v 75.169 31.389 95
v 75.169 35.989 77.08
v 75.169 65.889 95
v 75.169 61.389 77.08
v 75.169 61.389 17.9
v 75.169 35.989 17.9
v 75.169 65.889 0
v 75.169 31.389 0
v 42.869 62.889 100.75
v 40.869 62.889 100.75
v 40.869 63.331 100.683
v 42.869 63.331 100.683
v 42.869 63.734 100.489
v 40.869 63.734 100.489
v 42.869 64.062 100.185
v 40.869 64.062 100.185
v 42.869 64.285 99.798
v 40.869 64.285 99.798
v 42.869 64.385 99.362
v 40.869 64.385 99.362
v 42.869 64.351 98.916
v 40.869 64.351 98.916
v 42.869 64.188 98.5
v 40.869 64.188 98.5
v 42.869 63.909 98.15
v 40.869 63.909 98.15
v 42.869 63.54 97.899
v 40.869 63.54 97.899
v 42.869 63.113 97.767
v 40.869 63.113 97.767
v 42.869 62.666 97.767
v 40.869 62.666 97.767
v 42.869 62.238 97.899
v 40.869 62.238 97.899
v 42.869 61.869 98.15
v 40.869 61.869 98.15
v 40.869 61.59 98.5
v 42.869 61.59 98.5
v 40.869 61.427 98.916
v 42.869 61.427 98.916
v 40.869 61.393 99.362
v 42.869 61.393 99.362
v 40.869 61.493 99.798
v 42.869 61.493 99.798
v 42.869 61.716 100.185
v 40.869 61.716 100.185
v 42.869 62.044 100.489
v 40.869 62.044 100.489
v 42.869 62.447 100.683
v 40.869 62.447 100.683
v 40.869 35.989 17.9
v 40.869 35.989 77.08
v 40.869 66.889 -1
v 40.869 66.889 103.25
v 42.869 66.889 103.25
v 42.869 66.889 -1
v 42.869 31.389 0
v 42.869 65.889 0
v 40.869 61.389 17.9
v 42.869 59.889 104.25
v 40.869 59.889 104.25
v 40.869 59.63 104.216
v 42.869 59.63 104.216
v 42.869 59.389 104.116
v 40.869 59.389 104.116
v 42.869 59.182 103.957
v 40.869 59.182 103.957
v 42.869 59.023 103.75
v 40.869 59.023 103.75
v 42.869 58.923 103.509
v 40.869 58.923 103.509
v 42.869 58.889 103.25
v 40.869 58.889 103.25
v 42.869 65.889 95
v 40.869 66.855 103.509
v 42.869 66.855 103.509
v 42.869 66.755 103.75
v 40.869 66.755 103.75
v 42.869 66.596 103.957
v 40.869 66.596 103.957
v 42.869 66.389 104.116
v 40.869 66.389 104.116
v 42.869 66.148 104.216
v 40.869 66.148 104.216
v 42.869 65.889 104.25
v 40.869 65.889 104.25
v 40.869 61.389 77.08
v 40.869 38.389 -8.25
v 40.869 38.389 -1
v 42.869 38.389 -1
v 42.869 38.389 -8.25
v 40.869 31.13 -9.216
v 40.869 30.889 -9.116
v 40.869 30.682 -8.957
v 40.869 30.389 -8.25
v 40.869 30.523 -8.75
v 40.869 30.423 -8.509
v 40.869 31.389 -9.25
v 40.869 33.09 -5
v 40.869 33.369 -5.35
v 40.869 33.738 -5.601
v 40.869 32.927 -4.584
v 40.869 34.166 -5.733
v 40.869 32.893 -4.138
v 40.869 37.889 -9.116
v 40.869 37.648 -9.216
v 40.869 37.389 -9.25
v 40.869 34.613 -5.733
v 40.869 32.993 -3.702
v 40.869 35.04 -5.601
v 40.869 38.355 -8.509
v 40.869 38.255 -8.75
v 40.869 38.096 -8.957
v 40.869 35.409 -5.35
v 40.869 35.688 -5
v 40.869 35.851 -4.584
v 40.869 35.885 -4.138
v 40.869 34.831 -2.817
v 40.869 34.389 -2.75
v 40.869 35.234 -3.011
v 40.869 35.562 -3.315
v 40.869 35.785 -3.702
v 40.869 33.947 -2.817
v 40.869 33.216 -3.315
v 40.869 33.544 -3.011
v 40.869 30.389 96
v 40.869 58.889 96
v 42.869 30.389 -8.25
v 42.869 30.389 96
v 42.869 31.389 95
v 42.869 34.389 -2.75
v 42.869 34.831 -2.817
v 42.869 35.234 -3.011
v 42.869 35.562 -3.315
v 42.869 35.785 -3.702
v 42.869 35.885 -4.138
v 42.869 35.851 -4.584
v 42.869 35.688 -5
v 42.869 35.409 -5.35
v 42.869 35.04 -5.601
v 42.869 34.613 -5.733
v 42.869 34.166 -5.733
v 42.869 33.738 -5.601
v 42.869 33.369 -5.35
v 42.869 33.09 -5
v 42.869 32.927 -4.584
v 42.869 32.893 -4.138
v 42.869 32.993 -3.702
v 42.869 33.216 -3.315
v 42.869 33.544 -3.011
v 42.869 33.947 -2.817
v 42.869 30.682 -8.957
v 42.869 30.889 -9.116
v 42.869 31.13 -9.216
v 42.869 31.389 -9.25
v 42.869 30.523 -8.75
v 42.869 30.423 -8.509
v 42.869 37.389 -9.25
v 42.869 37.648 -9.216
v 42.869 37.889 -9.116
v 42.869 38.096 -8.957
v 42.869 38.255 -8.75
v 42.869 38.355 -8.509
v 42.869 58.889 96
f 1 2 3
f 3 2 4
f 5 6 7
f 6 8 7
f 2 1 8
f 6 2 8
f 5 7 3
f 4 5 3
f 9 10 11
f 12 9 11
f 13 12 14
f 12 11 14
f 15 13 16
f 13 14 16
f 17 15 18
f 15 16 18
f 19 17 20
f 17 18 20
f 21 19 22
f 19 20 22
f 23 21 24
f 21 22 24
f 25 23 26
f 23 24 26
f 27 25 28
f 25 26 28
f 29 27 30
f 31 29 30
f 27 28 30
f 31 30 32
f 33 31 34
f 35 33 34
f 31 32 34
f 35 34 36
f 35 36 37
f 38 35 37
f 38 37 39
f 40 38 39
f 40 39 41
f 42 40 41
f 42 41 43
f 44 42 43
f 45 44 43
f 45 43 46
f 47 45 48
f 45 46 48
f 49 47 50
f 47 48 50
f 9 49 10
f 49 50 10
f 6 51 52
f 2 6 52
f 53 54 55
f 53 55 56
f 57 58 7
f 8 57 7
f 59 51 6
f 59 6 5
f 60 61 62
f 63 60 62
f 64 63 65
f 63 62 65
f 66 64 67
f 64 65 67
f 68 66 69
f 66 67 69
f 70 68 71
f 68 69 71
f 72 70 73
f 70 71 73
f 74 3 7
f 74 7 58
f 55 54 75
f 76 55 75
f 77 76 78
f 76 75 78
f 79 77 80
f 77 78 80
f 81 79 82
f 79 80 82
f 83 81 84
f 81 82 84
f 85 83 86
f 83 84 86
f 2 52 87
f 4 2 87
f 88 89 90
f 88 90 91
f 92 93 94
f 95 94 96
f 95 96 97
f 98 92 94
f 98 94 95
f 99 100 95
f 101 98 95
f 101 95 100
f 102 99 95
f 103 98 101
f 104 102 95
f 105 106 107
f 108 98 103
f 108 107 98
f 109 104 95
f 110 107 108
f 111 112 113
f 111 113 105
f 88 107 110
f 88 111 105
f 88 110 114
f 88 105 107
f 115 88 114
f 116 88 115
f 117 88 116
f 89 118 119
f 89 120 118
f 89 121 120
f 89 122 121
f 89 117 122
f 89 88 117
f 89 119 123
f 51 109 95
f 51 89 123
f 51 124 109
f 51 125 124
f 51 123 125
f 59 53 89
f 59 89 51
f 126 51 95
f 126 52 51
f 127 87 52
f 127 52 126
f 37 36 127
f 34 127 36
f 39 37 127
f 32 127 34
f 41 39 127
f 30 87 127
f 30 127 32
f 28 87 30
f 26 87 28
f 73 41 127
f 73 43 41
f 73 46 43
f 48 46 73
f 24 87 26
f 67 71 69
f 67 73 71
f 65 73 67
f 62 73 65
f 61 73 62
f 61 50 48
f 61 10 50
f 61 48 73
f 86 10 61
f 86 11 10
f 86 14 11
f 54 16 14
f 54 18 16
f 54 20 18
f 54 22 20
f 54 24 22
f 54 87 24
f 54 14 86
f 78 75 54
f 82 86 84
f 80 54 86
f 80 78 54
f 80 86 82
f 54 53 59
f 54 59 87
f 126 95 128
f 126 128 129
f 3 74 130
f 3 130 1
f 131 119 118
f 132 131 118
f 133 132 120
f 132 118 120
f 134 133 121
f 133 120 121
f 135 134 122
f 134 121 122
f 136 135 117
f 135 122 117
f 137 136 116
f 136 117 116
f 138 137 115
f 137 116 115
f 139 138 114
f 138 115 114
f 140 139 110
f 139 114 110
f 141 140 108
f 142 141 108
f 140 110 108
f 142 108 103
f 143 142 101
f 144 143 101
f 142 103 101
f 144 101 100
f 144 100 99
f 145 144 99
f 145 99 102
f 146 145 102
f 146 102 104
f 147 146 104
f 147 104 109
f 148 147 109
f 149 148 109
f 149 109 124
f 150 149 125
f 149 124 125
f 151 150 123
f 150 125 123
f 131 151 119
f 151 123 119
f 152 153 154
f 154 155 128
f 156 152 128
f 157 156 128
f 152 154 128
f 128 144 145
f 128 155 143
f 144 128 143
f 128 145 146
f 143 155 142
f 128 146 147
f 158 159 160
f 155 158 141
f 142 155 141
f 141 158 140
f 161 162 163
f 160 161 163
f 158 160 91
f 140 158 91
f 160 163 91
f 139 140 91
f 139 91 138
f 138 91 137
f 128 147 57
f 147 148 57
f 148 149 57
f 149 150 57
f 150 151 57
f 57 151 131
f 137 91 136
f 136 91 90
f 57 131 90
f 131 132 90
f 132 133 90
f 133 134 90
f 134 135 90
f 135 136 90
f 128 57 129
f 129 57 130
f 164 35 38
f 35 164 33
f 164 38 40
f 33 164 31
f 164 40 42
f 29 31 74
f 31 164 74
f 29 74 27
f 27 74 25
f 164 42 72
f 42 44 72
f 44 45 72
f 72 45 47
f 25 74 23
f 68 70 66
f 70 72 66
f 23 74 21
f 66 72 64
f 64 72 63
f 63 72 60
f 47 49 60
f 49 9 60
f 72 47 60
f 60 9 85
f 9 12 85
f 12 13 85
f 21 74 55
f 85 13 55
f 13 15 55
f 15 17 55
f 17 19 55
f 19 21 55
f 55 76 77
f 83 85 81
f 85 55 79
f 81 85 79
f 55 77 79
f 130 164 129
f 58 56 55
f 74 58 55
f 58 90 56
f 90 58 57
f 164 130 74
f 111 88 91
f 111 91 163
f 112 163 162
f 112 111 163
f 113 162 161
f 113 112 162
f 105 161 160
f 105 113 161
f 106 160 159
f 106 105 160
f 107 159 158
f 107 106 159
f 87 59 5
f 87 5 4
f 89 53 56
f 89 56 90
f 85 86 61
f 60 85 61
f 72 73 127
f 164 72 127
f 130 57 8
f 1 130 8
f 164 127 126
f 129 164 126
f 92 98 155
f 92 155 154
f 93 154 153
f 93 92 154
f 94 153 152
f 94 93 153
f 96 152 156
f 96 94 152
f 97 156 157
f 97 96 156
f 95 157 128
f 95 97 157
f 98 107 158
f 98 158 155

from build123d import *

# Parameters (mm, degrees)
BOSS_EXTRUDE1_DEPTH = 95
SKETCH2_R           = 1.5
BOSS_EXTRUDE2_DEPTH = 2
SKETCH3_W           = 59.18
SKETCH3_H           = 25.4
CUT_EXTRUDE1_DEPTH  = 129.525100261


with BuildPart() as part:
    # Sketch1 → Boss-Extrude1 (new body)
    with BuildSketch(Plane.XY):
        Polygon((40.869322236, 66.889079057), (40.869322236, 30.389079057), (42.869322236, 30.389079057), (42.869322236, 31.389079057), (75.169322236, 31.389079057), (75.169322236, 65.889079057), (42.869322236, 65.889079057), (42.869322236, 66.889079057), align=None)
    extrude(amount=BOSS_EXTRUDE1_DEPTH)

    # Sketch2 → Boss-Extrude2 (add)
    # profile 1 of 2: a face of its own
    with BuildSketch(Plane.ZY.offset(-40.869322236)):
        with BuildLine():
            Line((-1, 38.389079057), (-8.25, 38.389079057))
            ThreePointArc((-8.25, 38.389079057), (-8.957106781, 38.096185839), (-9.25, 37.389079057))
            Line((-9.25, 37.389079057), (-9.25, 31.389079057))
            ThreePointArc((-9.25, 31.389079057), (-8.957106781, 30.681972276), (-8.25, 30.389079057))
            Line((-8.25, 30.389079057), (0, 30.389079057))
            Line((0, 30.389079057), (0, 38.389079057))
            Line((0, 38.389079057), (0, 66.889079057))
            Line((0, 66.889079057), (-1, 66.889079057))
            Line((-1, 66.889079057), (-1, 38.389079057))
        make_face()
        with Locations((-4.25, 34.389079057)):
            Circle(SKETCH2_R, mode=Mode.SUBTRACT)
    # profile 2 of 2: a face of its own
    with BuildSketch(Plane.ZY.offset(-40.869322236)):
        with BuildLine():
            Line((95, 66.889079057), (103.25, 66.889079057))
            ThreePointArc((103.25, 66.889079057), (103.957106781, 66.596185839), (104.25, 65.889079057))
            Line((104.25, 65.889079057), (104.25, 59.889079057))
            ThreePointArc((104.25, 59.889079057), (103.957106781, 59.181972276), (103.25, 58.889079057))
            Line((103.25, 58.889079057), (96, 58.889079057))
            Line((96, 58.889079057), (96, 30.389079057))
            Line((96, 30.389079057), (95, 30.389079057))
            Line((95, 30.389079057), (95, 58.889079057))
            Line((95, 58.889079057), (95, 66.889079057))
        make_face()
        with Locations((99.25, 62.889079057)):
            Circle(SKETCH2_R, mode=Mode.SUBTRACT)
    extrude(amount=-BOSS_EXTRUDE2_DEPTH)

    # Sketch3 → Cut-Extrude1 (cut, through all)
    with BuildSketch(Plane.ZY.offset(-40.869322236)):
        with Locations((47.49, 48.689079057)):
            Rectangle(SKETCH3_W, SKETCH3_H)
    extrude(amount=-CUT_EXTRUDE1_DEPTH, mode=Mode.SUBTRACT)


solid = part.part
